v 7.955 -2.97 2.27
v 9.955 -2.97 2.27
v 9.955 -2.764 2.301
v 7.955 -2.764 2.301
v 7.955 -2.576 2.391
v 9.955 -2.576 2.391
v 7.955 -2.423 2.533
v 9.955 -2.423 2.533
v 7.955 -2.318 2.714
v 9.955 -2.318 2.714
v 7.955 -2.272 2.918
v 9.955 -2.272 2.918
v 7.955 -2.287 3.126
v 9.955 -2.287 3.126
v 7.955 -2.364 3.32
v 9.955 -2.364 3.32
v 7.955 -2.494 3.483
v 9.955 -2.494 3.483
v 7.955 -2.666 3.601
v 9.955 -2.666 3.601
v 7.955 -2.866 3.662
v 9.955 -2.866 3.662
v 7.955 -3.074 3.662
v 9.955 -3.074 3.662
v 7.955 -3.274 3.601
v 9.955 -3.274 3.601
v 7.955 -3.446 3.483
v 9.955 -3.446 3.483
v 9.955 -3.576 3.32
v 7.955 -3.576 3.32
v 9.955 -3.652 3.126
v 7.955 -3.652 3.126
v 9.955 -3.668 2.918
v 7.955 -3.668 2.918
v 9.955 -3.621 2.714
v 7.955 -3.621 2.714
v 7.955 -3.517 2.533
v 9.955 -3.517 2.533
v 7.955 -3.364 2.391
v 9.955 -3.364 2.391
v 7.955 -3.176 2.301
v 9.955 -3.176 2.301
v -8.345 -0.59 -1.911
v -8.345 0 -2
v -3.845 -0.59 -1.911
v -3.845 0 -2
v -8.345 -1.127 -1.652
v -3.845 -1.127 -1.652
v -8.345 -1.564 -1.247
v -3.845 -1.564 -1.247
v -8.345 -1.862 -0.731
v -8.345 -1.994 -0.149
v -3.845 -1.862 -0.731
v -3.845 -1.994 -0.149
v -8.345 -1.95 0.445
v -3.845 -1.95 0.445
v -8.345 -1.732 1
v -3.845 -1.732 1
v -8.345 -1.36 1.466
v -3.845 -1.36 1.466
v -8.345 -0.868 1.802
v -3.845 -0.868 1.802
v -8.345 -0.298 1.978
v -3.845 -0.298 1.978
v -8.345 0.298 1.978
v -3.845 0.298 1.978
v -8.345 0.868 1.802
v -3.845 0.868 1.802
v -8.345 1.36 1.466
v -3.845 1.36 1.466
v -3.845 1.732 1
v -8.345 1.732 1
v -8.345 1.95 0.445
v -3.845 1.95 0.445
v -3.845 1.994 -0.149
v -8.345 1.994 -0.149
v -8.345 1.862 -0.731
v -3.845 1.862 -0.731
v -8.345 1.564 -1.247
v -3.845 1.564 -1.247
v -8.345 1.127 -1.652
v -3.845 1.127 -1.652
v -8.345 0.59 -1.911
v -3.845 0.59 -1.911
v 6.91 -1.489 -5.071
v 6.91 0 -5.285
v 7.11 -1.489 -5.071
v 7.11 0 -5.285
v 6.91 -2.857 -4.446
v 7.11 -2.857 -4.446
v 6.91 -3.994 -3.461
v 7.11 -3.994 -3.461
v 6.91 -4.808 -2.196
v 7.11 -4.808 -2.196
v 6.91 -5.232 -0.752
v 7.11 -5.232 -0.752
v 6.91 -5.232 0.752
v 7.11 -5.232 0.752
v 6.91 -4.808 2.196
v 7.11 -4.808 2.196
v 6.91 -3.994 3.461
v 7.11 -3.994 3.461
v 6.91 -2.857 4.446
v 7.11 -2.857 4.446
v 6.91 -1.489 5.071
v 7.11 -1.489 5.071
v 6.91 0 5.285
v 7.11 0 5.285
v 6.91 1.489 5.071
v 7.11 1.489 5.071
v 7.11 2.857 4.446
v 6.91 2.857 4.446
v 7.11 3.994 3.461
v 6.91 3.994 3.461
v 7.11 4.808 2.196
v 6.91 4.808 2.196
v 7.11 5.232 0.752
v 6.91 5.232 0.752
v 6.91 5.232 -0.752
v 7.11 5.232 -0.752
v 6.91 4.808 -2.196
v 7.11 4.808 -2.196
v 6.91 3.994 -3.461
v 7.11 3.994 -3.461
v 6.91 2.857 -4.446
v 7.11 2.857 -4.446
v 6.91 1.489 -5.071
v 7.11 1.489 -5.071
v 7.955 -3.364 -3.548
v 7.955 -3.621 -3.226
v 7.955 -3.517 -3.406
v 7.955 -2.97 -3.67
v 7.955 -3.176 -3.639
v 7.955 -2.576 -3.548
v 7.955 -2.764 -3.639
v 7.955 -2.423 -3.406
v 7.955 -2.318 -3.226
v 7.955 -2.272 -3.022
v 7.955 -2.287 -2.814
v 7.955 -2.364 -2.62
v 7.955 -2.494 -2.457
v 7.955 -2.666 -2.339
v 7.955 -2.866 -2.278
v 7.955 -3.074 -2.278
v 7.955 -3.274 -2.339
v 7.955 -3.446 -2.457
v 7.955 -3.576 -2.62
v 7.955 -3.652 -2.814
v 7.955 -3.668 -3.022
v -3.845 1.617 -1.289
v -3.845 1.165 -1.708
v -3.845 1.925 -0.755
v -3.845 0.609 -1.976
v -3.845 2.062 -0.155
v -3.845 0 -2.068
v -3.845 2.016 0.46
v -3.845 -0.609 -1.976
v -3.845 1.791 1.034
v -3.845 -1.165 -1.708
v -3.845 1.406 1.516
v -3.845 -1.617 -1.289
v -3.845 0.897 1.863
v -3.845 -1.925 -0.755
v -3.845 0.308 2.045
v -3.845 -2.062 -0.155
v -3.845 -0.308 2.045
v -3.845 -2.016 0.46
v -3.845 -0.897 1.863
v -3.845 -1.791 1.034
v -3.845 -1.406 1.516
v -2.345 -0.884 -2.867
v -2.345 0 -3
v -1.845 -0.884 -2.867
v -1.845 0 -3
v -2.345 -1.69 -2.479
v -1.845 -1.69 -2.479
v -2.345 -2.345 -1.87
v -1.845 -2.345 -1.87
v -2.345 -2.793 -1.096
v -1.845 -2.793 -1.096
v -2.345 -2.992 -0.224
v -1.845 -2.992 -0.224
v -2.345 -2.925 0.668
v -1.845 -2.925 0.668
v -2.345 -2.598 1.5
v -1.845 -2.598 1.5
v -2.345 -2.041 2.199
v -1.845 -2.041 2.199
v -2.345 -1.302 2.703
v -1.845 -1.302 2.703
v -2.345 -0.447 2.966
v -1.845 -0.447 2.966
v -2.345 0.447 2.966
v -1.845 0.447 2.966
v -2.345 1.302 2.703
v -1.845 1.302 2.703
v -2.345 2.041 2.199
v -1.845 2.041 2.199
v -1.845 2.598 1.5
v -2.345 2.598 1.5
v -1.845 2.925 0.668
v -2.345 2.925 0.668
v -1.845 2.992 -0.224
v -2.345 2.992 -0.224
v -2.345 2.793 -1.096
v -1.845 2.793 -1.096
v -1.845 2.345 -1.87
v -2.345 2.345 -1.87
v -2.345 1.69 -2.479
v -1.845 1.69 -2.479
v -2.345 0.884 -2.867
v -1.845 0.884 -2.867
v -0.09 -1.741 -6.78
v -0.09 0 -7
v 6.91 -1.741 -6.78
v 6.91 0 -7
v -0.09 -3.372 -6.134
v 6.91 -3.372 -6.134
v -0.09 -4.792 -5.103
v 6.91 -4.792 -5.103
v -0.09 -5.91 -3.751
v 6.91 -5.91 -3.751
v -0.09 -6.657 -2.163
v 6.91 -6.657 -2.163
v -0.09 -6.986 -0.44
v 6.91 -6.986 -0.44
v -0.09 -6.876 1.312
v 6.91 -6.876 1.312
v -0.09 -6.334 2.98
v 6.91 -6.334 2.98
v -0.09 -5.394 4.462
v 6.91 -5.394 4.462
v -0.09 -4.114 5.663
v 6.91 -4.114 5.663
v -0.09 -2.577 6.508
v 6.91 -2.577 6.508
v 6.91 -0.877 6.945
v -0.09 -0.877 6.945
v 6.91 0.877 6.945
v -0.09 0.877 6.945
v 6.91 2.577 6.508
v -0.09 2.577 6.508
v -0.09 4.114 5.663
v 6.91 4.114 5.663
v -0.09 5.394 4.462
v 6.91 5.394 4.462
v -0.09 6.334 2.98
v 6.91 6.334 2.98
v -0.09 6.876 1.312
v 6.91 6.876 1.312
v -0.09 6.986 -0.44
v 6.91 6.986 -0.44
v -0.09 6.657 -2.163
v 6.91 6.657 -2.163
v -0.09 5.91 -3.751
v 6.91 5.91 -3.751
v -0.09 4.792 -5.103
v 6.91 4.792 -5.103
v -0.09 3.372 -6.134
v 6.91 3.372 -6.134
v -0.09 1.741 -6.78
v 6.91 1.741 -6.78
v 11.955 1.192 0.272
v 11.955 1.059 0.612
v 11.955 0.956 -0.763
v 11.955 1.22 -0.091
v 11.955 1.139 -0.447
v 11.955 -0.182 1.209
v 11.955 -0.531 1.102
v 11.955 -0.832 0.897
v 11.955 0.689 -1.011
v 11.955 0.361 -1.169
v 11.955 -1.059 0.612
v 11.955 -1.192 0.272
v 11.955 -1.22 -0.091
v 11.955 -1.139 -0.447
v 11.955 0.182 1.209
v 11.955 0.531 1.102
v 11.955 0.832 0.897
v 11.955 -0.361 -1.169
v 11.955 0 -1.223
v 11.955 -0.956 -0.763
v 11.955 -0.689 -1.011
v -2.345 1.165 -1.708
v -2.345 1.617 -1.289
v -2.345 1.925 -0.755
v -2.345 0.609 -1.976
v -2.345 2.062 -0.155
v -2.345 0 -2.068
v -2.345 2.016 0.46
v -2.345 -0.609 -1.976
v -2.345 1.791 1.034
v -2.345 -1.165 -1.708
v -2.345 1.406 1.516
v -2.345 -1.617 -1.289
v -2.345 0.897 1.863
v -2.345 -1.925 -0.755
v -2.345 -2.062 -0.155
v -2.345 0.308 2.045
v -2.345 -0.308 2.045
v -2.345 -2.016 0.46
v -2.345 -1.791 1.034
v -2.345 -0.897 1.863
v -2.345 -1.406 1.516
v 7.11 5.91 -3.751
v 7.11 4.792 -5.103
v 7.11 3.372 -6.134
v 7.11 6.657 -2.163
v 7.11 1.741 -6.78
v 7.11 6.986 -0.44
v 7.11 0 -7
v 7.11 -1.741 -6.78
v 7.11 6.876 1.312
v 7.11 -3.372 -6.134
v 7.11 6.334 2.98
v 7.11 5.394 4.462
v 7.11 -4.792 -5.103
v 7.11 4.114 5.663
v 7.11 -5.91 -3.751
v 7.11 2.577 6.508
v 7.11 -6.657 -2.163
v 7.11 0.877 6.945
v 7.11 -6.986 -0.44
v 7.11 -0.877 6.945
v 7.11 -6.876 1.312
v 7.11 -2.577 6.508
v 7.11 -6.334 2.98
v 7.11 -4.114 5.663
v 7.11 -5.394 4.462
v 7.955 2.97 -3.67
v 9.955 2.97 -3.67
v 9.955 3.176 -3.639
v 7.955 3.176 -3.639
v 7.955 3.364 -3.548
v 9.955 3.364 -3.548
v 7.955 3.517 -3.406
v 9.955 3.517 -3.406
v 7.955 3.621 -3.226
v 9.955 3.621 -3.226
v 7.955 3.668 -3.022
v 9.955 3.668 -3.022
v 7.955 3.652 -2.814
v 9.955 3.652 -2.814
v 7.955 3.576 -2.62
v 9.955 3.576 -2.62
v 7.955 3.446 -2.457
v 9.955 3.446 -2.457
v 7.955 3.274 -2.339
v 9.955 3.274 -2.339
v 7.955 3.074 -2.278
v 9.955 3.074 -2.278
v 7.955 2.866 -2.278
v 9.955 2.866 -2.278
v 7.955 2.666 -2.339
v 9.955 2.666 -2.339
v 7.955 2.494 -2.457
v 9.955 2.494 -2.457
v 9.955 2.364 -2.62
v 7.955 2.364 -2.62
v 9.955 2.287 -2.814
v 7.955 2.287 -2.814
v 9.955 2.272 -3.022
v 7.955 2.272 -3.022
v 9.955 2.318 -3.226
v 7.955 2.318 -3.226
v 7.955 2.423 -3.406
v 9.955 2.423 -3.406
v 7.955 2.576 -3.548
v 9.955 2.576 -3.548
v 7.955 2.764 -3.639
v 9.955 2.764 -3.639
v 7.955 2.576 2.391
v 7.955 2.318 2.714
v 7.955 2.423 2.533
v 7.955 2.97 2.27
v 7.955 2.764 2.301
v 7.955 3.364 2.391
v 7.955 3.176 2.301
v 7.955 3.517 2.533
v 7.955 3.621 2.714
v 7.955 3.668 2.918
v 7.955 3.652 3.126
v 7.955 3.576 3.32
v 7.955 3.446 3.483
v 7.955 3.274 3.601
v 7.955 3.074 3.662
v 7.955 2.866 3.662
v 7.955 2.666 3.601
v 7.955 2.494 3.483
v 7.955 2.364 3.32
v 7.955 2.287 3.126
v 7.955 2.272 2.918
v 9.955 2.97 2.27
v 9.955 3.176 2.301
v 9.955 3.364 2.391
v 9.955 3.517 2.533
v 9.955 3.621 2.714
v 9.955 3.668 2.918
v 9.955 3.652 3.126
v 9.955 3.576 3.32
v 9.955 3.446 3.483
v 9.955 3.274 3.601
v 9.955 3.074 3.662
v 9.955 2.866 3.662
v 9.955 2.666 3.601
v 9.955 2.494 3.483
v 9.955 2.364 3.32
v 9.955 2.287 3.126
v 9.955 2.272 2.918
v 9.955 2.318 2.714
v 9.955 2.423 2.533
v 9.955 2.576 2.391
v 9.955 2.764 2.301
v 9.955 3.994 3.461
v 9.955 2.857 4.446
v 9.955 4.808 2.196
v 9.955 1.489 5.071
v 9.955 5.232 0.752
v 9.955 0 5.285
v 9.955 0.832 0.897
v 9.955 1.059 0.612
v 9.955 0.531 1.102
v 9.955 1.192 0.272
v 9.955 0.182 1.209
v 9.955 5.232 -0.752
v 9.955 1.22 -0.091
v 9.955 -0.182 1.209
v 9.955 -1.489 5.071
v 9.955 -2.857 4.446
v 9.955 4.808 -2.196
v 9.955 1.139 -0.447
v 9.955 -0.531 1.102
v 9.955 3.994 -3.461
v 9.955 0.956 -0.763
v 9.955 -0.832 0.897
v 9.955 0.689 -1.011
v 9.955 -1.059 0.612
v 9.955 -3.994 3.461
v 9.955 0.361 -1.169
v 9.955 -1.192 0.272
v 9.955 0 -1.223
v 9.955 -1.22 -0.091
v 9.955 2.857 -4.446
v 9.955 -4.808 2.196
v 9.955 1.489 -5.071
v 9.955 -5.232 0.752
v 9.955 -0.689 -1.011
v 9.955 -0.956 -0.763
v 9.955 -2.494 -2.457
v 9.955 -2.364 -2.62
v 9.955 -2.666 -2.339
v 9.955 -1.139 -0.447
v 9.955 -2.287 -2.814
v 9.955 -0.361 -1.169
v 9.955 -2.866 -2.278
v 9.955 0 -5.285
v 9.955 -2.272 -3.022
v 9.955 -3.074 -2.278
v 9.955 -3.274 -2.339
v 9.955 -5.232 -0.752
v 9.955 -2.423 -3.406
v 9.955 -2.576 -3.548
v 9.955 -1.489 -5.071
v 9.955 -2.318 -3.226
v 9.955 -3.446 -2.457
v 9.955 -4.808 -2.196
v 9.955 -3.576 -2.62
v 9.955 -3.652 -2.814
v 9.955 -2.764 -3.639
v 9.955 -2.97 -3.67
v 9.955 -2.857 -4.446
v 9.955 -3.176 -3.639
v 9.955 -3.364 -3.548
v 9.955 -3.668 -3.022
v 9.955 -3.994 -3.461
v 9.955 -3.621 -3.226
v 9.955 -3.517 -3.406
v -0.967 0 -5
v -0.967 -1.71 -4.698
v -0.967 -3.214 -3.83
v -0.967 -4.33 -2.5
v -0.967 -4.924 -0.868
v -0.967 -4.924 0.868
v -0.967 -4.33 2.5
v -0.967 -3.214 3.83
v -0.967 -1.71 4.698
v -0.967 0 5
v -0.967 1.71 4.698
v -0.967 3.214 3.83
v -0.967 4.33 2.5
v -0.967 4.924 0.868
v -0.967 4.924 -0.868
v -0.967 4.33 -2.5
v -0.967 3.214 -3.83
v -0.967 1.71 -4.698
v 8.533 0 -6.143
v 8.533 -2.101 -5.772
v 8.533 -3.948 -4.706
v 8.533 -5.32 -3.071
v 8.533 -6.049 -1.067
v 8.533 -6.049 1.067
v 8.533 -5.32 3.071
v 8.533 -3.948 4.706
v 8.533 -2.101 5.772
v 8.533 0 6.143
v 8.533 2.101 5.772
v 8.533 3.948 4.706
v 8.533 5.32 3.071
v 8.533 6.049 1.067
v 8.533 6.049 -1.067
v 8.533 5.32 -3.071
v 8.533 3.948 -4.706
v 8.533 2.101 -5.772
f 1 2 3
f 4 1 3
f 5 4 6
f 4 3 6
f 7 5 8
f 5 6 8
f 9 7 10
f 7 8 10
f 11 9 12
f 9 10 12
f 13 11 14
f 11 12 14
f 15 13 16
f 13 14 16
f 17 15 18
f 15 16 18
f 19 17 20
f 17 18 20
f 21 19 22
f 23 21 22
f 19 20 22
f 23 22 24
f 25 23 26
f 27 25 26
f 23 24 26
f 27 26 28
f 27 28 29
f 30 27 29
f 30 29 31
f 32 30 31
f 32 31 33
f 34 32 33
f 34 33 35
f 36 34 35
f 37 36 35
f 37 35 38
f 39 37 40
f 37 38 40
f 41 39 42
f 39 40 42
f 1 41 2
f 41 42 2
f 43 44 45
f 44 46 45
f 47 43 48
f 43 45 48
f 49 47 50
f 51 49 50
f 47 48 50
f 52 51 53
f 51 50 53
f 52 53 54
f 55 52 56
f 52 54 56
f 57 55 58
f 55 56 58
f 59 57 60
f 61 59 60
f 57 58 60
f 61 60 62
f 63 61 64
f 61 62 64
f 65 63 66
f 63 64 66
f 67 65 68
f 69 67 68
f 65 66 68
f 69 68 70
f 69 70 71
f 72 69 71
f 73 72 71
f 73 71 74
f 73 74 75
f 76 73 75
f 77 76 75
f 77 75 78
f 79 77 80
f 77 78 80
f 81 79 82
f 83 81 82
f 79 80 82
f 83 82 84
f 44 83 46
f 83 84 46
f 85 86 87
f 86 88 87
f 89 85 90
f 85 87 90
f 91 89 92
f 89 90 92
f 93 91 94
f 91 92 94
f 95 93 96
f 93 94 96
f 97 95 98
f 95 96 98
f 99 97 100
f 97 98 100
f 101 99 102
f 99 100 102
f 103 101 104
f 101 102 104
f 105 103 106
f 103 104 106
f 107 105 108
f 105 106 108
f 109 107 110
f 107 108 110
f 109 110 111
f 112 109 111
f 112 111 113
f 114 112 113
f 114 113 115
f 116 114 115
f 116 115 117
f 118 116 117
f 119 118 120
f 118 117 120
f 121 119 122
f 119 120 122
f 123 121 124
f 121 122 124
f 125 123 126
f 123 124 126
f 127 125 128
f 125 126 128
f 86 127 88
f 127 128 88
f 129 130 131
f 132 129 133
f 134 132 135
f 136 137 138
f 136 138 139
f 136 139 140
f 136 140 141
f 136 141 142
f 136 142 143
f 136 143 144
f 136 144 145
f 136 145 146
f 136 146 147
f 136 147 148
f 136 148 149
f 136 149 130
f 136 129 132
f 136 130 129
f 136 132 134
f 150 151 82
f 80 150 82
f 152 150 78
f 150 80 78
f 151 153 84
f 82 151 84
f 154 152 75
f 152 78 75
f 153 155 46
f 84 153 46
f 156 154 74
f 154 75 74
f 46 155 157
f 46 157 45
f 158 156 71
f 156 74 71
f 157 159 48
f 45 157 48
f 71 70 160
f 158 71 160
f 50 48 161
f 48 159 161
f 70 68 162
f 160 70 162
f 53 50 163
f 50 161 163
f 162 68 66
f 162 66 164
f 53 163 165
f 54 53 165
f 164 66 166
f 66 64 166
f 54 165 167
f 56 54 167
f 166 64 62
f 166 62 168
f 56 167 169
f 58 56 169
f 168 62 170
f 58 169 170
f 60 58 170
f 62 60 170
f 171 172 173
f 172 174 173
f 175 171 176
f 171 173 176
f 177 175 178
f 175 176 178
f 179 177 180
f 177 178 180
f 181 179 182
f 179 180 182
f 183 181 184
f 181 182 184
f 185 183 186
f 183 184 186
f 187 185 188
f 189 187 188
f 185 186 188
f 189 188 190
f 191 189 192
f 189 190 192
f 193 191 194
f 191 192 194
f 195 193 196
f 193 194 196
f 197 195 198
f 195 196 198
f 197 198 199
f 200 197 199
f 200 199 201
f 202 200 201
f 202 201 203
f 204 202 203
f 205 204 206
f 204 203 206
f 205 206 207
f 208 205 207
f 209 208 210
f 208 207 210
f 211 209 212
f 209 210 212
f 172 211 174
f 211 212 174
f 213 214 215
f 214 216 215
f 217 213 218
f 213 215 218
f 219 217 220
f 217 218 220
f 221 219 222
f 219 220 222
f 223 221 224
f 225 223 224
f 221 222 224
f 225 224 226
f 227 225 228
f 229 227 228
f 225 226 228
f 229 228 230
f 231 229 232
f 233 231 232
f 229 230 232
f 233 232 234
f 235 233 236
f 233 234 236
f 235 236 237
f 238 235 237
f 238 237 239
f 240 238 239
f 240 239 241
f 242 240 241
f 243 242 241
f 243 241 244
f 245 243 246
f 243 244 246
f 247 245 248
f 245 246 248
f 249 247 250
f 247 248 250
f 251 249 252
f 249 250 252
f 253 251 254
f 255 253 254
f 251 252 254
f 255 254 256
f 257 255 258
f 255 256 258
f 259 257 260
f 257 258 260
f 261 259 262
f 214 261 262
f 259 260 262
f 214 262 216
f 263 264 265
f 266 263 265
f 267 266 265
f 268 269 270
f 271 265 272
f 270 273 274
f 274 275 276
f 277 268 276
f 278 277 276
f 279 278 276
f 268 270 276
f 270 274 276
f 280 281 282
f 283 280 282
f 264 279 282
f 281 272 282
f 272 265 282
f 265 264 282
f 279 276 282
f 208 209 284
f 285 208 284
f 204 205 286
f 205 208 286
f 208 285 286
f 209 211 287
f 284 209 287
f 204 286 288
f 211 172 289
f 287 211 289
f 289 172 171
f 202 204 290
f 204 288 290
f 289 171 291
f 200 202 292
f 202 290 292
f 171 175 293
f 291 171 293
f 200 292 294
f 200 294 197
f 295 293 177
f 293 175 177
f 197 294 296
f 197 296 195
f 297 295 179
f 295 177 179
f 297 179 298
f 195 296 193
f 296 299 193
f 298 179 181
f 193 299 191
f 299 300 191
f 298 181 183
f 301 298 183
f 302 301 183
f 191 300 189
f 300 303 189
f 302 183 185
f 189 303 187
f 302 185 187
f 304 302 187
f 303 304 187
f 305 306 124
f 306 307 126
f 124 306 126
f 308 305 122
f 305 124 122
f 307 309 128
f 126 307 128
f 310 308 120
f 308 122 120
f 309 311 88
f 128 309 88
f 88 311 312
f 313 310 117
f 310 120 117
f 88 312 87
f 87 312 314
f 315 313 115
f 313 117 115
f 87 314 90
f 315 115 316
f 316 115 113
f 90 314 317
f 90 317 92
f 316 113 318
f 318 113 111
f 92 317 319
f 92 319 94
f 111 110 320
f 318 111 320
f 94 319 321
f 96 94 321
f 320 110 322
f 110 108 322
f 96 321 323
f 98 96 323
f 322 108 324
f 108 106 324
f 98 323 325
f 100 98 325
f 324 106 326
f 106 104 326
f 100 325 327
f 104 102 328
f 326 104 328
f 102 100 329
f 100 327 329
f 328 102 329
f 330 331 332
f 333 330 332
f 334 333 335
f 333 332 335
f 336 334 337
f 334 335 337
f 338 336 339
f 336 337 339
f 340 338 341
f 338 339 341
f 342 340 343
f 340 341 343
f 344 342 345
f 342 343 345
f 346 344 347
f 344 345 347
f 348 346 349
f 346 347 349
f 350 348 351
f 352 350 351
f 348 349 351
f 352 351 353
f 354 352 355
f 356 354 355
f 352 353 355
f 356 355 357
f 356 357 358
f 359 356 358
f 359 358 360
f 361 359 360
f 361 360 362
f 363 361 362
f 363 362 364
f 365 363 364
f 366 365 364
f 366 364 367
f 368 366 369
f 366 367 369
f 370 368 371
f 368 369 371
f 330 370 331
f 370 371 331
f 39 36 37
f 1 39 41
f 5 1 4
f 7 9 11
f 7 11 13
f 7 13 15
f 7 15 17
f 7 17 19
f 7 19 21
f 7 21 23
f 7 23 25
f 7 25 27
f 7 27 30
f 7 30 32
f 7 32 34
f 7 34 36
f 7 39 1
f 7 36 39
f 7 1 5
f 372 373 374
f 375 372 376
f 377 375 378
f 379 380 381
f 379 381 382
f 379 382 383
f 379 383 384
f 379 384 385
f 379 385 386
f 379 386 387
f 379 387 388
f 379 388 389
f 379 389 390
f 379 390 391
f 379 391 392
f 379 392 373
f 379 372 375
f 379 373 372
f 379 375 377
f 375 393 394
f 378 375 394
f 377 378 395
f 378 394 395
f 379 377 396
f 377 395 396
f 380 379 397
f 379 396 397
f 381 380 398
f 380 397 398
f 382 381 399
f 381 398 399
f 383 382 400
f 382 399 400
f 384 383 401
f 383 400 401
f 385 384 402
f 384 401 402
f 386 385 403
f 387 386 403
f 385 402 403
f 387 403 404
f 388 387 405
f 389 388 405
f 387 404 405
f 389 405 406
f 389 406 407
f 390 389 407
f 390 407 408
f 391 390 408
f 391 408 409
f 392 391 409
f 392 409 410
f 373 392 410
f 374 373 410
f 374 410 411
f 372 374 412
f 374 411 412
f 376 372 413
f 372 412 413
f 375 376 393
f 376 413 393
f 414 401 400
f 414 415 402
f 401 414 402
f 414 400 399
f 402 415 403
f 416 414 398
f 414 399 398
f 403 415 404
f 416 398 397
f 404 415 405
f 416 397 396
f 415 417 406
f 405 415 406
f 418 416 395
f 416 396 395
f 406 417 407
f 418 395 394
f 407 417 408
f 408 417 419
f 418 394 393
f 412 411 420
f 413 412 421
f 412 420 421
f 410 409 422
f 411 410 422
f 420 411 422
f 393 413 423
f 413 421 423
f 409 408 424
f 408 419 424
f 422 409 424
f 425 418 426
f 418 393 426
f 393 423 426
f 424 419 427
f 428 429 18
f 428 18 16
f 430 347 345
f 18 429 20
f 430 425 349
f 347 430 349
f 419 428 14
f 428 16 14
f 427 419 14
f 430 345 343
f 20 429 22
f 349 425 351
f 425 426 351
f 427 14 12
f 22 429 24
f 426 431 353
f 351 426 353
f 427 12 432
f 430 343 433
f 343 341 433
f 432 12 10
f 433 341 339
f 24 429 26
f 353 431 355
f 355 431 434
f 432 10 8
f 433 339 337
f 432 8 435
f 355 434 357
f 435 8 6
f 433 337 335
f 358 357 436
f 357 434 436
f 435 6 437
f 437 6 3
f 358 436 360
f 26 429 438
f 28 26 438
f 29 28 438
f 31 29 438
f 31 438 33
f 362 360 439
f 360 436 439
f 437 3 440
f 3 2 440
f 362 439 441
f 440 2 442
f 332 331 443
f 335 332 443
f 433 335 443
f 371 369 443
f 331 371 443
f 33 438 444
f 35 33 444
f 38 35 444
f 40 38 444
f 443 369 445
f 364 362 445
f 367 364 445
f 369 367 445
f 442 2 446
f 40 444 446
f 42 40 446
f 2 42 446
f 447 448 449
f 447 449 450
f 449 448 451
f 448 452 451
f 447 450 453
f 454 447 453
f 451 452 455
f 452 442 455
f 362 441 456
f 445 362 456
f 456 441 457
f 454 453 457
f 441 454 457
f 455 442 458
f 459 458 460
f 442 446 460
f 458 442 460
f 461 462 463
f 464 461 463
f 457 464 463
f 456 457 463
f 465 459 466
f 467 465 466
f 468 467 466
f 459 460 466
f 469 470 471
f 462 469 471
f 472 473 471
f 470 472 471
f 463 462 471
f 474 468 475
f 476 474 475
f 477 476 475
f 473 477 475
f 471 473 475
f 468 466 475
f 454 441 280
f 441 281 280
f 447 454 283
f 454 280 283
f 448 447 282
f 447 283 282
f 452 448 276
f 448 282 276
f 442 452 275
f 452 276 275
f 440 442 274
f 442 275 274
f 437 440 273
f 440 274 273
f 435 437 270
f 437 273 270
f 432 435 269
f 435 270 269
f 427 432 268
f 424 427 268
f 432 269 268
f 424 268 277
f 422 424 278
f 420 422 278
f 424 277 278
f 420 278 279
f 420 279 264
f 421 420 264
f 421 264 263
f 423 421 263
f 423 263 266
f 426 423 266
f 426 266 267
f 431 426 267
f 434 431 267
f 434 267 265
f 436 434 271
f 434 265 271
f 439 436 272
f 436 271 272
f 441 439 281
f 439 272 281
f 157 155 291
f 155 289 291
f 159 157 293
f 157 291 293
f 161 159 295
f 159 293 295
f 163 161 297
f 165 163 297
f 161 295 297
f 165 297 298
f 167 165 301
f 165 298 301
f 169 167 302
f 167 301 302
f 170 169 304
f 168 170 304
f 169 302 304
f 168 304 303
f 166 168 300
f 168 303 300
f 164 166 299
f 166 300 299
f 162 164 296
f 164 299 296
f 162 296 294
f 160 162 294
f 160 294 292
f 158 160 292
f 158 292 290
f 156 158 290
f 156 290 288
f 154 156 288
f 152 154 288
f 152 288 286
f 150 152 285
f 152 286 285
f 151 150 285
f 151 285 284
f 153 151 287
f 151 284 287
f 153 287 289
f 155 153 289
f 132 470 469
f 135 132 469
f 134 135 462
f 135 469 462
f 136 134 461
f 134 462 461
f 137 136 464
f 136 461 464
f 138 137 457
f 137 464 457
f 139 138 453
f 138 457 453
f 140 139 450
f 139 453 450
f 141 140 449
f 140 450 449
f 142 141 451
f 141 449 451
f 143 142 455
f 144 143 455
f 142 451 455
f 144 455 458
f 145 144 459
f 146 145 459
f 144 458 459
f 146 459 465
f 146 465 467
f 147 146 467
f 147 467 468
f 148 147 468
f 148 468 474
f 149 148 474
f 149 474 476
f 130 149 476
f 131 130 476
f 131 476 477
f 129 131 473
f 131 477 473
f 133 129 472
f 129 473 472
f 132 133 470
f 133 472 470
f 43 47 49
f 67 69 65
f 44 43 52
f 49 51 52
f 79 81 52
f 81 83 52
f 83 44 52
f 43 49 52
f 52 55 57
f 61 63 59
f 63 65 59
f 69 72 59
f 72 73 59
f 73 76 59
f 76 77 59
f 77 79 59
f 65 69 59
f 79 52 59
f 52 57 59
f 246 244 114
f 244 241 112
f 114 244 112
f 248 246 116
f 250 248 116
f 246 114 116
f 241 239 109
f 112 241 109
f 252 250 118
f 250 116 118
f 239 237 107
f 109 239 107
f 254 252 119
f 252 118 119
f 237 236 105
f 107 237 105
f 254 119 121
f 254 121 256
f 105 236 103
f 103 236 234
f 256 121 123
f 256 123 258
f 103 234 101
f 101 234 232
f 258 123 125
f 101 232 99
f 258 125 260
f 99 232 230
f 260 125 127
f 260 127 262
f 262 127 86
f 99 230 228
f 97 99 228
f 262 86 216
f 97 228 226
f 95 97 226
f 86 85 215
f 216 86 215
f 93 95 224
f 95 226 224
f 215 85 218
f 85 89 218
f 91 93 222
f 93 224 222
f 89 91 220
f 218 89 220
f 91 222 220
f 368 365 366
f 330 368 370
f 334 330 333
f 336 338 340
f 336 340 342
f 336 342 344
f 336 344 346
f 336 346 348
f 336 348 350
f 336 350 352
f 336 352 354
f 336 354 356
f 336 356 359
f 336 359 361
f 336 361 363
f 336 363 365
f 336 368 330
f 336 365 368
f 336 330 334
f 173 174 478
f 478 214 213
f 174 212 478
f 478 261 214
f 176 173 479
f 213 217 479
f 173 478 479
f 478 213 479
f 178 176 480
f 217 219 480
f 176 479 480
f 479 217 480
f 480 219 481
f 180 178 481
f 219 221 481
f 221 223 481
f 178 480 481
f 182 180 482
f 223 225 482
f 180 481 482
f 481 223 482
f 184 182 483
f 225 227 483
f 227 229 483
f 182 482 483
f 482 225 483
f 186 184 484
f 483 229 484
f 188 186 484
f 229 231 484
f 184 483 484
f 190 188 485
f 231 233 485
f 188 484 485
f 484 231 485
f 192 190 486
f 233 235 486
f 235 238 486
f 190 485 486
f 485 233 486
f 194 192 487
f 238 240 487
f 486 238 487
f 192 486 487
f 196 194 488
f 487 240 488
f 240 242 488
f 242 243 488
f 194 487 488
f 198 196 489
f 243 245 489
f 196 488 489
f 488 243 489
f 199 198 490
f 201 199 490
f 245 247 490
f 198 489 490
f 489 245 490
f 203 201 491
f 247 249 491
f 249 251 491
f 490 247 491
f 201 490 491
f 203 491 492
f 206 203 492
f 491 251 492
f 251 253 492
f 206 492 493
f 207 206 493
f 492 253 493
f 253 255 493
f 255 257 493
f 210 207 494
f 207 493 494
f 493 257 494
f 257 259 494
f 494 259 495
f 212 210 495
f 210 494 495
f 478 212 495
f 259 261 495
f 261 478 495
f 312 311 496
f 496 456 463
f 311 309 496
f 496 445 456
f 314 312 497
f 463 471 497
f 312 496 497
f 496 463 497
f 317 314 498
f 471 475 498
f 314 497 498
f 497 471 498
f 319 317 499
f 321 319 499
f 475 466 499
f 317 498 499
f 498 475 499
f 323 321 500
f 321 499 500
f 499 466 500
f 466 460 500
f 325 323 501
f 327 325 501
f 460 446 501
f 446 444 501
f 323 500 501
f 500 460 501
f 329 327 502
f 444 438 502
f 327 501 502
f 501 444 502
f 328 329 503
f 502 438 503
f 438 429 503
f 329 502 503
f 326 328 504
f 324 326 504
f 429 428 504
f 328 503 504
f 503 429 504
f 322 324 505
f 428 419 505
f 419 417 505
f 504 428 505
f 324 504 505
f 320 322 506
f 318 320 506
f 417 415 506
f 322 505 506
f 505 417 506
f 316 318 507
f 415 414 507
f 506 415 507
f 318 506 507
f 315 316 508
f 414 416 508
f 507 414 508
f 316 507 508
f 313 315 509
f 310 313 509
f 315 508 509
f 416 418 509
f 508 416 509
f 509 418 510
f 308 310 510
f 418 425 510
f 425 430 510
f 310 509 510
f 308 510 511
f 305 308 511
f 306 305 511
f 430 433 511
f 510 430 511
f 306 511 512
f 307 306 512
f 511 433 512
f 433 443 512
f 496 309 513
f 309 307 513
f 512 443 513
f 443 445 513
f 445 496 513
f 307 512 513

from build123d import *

# Parameters (mm, degrees)
SKETCH3_R          = 0.7
CUT_EXTRUDE1_DEPTH = 2


with BuildPart() as part:
    # Sketch2 → Revolve1 (revolve)
    with BuildSketch(Plane(origin=(0, 0, 0), x_dir=(1, 0, 0), z_dir=(0, 1, 0))):
        Polygon((-2.345452762, 2.067742112), (-2.345452762, 3), (-1.845452762, 3), (-0.089526495, 7), (6.910473505, 7), (6.910473505, 5.285375335), (7.110473505, 5.285375335), (7.110473505, 7), (9.954547238, 5.285375335), (9.954547238, 1.223141528), (11.954547238, 1.223141528), (11.954547238, 0), (-8.345452762, 0), (-8.345452762, 2), (-3.845452762, 2), (-3.845452762, 2.067742112), align=None)
    revolve(axis=Axis((11.954547238, 0, 0), (-1, 0, 0)))

    # Sketch3 → Cut-Extrude1 (cut)
    with BuildSketch(Plane(origin=(9.954547238, 0, 0), x_dir=(0, 0, -1), z_dir=(1, 0, 0))):
        with Locations((2.969848481, 2.969848481)):
            Circle(SKETCH3_R)
        with Locations((2.969848481, -2.969848481)):
            Circle(SKETCH3_R)
        with Locations((-2.969848481, -2.969848481)):
            Circle(SKETCH3_R)
        with Locations((-2.969848481, 2.969848481)):
            Circle(SKETCH3_R)
    extrude(amount=-CUT_EXTRUDE1_DEPTH, mode=Mode.SUBTRACT)


solid = part.part
